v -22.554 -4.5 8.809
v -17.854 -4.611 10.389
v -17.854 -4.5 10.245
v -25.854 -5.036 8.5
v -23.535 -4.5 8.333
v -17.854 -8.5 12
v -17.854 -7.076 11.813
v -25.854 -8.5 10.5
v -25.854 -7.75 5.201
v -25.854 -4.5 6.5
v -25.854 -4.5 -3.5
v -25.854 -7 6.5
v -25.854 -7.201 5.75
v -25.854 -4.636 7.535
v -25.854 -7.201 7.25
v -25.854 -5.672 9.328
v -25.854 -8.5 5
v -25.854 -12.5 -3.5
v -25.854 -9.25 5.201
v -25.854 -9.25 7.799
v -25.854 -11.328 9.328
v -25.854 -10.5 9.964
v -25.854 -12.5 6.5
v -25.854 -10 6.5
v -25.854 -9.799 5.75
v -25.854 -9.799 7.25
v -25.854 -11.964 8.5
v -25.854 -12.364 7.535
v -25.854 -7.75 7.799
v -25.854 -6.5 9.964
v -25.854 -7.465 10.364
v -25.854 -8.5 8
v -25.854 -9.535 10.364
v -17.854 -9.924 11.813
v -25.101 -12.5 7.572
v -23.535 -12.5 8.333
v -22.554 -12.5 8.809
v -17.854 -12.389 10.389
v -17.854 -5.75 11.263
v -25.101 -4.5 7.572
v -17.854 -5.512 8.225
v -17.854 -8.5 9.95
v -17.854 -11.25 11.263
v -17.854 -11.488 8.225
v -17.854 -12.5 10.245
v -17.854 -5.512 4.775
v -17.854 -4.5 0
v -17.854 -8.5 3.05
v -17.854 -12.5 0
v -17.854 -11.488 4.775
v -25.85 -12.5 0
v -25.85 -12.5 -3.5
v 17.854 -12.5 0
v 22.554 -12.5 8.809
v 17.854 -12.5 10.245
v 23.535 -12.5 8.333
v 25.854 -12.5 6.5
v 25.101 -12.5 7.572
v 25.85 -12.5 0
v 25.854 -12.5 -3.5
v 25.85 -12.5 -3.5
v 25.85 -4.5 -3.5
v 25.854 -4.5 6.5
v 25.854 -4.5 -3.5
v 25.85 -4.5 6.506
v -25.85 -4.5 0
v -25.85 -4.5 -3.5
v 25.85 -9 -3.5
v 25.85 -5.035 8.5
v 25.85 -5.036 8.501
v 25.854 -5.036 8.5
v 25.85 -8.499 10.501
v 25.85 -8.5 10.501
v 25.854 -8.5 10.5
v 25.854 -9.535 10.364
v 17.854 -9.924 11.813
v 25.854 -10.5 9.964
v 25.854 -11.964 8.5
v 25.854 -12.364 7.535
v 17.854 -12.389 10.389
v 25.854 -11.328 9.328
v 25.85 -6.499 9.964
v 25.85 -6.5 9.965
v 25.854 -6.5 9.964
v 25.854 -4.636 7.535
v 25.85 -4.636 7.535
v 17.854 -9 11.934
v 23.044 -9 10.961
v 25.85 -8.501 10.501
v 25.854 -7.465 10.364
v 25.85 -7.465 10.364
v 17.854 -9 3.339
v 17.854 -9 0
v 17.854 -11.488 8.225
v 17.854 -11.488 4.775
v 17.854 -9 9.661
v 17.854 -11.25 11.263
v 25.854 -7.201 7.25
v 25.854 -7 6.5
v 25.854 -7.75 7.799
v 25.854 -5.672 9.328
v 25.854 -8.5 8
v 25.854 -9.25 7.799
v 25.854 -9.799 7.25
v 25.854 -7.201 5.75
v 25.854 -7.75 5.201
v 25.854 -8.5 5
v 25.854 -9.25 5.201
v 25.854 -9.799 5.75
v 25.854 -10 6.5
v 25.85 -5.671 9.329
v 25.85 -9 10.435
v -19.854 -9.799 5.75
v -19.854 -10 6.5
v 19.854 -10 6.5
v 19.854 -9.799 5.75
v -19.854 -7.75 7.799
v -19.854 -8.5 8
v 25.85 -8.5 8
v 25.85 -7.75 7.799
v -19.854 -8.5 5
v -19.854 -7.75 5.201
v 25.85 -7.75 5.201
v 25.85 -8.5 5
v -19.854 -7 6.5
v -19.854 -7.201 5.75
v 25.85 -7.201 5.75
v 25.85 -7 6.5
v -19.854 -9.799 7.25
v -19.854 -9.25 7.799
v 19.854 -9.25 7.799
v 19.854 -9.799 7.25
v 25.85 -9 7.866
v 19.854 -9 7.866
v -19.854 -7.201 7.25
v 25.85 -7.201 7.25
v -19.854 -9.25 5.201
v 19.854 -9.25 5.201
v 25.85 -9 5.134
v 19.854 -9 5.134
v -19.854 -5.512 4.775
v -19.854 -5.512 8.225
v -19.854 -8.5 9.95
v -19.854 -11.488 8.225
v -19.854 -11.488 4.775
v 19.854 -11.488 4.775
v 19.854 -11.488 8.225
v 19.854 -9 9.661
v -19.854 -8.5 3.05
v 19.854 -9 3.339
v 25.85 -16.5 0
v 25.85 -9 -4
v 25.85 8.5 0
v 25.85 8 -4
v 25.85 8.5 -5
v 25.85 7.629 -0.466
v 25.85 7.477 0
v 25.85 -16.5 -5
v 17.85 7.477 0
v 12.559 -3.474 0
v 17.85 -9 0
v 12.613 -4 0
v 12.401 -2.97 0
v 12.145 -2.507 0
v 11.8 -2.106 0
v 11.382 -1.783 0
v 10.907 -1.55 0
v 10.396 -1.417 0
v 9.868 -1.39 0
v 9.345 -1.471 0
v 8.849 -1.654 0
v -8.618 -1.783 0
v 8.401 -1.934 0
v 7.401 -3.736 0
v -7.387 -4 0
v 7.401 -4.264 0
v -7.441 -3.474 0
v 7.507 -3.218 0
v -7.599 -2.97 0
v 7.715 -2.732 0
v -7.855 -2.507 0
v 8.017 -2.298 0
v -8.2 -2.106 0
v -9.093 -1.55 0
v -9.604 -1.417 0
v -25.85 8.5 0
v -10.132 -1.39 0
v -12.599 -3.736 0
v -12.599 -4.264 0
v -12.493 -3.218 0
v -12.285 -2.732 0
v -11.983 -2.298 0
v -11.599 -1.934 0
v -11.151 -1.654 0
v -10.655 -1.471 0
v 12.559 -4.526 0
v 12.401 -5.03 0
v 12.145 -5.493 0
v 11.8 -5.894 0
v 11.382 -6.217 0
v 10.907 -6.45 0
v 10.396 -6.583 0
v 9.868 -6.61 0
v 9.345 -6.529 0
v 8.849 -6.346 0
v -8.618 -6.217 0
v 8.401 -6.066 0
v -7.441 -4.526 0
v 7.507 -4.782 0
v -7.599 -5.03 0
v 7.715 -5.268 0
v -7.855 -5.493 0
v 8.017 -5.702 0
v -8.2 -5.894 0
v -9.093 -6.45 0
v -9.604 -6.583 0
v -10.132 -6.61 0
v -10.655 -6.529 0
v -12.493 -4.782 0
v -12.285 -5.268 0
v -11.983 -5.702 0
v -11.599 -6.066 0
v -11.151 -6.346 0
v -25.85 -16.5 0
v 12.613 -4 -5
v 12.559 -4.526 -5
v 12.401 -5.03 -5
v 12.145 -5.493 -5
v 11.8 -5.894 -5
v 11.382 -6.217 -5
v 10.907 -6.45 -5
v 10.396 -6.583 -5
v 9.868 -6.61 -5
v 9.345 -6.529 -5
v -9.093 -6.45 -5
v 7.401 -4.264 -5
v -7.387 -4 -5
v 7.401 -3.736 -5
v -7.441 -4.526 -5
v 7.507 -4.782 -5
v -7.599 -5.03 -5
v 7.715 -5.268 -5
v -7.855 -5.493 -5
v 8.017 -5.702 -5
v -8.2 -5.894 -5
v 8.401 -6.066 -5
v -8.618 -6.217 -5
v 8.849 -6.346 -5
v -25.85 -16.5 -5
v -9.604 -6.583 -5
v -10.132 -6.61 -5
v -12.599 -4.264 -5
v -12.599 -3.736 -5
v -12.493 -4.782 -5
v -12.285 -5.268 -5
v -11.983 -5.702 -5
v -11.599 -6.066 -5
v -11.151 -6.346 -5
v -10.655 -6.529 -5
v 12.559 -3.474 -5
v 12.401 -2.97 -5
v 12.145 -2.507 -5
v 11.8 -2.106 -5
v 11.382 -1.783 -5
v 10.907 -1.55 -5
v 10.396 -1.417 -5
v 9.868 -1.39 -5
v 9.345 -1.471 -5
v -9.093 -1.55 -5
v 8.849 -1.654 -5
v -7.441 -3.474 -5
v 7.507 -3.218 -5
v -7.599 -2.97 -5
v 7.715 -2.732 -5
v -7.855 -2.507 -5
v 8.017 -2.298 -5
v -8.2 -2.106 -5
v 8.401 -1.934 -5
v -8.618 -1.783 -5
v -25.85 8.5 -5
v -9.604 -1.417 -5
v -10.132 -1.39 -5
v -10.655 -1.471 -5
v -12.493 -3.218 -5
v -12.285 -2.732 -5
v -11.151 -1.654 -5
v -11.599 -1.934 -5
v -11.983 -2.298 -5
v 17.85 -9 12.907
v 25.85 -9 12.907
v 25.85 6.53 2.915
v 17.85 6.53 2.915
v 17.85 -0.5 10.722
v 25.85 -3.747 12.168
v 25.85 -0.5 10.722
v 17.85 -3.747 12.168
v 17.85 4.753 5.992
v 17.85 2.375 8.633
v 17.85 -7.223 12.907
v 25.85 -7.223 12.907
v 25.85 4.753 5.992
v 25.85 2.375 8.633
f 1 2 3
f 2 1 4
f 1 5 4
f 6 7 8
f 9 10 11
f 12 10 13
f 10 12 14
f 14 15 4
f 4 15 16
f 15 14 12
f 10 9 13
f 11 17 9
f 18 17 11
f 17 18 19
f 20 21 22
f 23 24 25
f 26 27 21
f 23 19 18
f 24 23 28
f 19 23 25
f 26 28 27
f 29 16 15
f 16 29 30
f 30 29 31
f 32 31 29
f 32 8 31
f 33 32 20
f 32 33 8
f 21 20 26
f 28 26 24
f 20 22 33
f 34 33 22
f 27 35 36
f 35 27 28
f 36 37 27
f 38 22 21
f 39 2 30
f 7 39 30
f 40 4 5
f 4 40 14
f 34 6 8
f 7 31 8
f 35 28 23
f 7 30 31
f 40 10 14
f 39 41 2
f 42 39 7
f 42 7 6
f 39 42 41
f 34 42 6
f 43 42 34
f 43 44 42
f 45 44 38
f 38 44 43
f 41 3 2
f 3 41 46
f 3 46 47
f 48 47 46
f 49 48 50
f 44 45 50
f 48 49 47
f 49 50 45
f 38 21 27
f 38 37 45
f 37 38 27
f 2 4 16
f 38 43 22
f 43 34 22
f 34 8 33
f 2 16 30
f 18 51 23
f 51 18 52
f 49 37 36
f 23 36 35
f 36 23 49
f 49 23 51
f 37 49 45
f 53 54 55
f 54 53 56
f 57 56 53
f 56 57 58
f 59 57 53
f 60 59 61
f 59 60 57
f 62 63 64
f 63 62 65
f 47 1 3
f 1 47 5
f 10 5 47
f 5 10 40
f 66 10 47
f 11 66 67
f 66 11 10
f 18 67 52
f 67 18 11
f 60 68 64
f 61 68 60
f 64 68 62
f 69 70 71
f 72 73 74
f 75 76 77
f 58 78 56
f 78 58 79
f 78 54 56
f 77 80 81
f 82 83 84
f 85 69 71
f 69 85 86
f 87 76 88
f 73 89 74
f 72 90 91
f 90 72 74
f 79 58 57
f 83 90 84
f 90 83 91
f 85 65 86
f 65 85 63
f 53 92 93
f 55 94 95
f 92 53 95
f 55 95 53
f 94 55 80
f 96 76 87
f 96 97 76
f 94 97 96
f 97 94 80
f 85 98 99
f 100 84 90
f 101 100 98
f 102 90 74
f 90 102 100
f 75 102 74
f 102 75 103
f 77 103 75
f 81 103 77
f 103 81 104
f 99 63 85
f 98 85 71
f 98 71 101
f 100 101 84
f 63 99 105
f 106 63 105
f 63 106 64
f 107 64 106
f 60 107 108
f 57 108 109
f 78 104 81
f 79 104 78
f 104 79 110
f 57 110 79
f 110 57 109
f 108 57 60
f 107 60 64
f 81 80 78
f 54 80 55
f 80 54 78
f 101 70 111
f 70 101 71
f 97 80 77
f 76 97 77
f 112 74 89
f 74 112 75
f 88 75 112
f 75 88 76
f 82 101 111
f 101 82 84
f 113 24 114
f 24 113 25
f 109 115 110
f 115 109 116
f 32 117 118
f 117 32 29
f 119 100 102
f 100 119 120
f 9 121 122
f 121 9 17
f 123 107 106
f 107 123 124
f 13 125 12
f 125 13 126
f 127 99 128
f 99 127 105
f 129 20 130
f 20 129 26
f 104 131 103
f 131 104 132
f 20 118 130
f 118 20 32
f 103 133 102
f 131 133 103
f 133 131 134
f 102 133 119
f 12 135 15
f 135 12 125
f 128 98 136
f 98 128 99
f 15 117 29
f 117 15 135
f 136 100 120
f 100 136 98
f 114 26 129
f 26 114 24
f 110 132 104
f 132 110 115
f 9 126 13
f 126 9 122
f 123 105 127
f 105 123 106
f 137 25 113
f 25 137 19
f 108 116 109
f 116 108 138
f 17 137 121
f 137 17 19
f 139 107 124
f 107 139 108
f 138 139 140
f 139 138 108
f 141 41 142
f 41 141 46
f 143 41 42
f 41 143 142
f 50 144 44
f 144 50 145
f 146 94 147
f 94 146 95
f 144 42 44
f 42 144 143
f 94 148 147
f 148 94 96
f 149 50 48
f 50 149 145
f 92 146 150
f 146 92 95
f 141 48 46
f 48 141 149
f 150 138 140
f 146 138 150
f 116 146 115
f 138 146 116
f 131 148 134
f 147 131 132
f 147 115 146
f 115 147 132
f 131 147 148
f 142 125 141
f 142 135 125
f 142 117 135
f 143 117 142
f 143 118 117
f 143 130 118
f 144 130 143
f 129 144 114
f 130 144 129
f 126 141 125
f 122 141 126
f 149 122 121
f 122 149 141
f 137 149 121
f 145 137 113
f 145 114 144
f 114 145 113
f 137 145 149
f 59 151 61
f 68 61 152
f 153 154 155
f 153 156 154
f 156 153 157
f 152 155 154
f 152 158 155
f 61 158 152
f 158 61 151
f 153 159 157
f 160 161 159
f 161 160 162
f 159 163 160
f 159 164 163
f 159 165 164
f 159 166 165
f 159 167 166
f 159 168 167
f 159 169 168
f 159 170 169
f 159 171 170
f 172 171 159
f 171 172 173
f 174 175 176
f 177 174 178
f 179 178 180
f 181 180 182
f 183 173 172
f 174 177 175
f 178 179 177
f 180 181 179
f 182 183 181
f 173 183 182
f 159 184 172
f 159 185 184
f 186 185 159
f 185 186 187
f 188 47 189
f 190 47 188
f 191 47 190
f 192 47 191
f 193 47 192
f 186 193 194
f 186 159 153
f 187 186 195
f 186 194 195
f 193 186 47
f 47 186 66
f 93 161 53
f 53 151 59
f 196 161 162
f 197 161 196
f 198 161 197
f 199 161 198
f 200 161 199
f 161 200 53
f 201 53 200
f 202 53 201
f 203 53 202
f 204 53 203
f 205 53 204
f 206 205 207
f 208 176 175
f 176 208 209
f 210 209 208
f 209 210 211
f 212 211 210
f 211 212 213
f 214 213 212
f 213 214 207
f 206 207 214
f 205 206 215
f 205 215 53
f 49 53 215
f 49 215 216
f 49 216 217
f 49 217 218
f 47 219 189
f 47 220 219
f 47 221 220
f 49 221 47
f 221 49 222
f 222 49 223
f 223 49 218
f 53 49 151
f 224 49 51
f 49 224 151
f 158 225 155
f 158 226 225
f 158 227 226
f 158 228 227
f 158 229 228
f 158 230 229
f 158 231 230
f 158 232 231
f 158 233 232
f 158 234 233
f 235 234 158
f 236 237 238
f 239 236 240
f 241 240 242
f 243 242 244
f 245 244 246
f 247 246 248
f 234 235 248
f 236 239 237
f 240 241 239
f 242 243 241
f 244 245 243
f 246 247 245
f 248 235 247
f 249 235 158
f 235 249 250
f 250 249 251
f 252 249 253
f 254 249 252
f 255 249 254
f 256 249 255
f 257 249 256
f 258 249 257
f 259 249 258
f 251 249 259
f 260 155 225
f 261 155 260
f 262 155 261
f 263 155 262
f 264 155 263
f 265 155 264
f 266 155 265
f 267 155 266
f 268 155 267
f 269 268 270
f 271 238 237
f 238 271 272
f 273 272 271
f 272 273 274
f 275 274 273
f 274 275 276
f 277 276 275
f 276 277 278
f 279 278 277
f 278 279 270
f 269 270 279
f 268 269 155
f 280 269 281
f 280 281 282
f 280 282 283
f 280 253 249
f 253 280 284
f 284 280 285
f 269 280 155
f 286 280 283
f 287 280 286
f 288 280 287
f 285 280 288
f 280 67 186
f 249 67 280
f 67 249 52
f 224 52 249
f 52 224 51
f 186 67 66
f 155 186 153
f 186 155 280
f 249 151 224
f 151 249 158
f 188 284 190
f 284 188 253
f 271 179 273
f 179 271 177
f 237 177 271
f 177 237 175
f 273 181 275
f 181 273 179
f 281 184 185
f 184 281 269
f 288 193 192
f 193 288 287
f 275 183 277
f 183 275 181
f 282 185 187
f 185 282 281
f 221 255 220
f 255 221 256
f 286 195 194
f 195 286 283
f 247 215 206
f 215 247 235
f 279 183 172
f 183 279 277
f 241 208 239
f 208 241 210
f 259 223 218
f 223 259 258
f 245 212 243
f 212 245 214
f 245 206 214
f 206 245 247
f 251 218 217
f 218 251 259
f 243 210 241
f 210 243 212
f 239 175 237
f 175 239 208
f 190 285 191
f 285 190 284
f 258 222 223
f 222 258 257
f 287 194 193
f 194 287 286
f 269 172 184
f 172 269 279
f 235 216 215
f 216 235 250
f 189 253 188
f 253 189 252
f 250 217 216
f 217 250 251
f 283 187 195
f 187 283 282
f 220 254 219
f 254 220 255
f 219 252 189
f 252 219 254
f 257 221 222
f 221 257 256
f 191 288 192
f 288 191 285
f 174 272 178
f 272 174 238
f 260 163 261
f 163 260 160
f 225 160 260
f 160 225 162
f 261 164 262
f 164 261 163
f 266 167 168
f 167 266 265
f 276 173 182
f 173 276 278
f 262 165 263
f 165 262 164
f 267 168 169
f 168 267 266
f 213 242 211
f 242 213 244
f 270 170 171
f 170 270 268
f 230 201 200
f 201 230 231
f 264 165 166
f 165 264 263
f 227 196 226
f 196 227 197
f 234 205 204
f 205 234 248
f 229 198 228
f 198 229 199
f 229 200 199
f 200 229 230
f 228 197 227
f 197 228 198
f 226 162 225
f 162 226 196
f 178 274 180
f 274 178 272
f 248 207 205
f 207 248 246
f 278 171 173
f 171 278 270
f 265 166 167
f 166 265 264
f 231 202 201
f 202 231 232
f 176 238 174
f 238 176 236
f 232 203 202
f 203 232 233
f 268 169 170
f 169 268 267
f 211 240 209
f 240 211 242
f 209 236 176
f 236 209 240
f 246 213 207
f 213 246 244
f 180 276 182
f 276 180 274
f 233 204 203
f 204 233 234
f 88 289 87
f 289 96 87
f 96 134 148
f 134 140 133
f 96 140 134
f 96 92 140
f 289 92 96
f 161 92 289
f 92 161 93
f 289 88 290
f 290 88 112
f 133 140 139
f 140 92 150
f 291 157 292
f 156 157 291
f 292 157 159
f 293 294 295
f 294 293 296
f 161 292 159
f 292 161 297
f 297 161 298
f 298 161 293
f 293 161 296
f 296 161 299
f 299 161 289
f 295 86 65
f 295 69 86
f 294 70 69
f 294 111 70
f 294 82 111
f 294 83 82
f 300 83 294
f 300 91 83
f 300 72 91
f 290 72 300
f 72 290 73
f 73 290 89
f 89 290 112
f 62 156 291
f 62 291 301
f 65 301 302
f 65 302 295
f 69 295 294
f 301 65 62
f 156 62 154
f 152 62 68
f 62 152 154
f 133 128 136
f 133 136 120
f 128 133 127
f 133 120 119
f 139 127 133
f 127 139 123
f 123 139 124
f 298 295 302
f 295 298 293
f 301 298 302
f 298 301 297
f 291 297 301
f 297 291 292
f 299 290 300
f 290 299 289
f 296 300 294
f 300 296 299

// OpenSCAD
// file: configuration.scad
// Increase this if your slicer or printer make holes too tight.
extra_radius = 0.2;

// OD = outside diameter, corner to corner.
m3_nut_od = 6.1;
m3_nut_radius = m3_nut_od/2 + 0.2 + extra_radius;

// Major diameter of metric 3mm thread.
m3_major = 2.85;
m3_radius = m3_major/2 + extra_radius;
m3_wide_radius = m3_major/2 + 0.2 + extra_radius;

// NEMA17 stepper motors.
motor_shaft_diameter = 5;
motor_shaft_radius = motor_shaft_diameter/2 + extra_radius;

// Frame brackets.
thickness = 3.6;
// file: myLibs.scad
pi= 3.14159265359;

module hole(diam, height, clearance= 0.1)
{
        fn= round(diam * pi / 0.5);
        cylinder(h= height, r=diam / 2 / cos(180 / fn) + clearance, $fn=fn);
}

module nutTrap(ffd, faces=6, height=1)
{
	cylinder(h= height, r=ffd / cos(180 / faces) / 2 + 0.05, $fn=faces);
}

// A slot which has rounded ends, but total length is l
module slot(d= 4, l= 8, ht= 1, clearance=0.1) {
	fn= round(d * pi / 0.5);
	rd= d / 2 / cos(180 / fn) + clearance;
	d1= rd*2;
	union() {
		translate([0,0,ht/2]) cube([l-d1, d1, ht], center=true);
		translate([-(l-d1)/2, 0, ht/2]) cylinder(h=ht, r=rd, $fn=fn, center=true); 
		translate([(l-d1)/2, 0, ht/2]) cylinder(h=ht, r=rd, $fn=fn, center=true); 
	}
	
}
// file: arm-mount.scad
include <configuration.scad>;

ratio= 1.39;
separation = 37.2*ratio;
radius = 33*ratio;
height = 8;
cone_r1 = height/2;
cone_r2 = 5.5;

echo("Separation= ", separation);

module arm_mount_raw() {
	difference() {
		union() {
	   		translate([-separation/2,-10,-height/2]) cube([separation, 2, height]);		
			intersection() {
		   		cube([separation, 20, height], center=true);
			    union() {
		          for (s = [-1, 1]) scale([s, 1, 1]) {
		            translate([separation/2-4, 0, 0]) rotate([0, 90, 0])
		              cylinder(r1=cone_r2, r2=cone_r1, h=8, center=true, $fn=24);
		            translate([separation/2-4, -5, 0])
		              cube([8, 10, height], center=true);
		          }
				}
			}
	  }
	  rotate([0, 90, 0])
	      cylinder(r=1.5, h=separation+1, center=true, $fn=12);
	  rotate([90, 0, 90])
	      cylinder(r=m3_nut_radius, h=separation-12, center=true, $fn=6);
	}
}

module arm_mount() {
	translate([0,10,0]) arm_mount_raw();
}

arm_mount();
// file: carriage_plate_standard_c14005_rev_2.scad
// MakerSlide Component
// http://www.makerslide.com
// c14005_rev_2
// Standard Wheel Carriage Plate
// Original by Barton Dring
// OpenSCAD model by Mike Sheldrake

centeredCarriagePlate();

module centeredCarriagePlate() {
	translate([-90/2,-160/2,0]) standard_wheel_carriage_plate();
}

module standard_wheel_carriage_plate(thickness=3.175) {
color([175/255,178/255,183/255])
difference() {

// 90mm by 160mm plate 
// 3.175mm thick by default,
// but you can pass a different thickness to this module
cube([90,160,3.175],center=false);

// 5mm diam. holes
for(i=[
  [12.7,10],
  [12.7,30],
  [12.7,70],
  [12.7,80],
  [12.7,90],
  [12.7,112.3],
  [12.7,130],
  [12.7,150],
  [35,10],
  [35,60],
  [35,80],
  [35,100],
  [35,150],
  [45,70],
  [45,90],
  [55,10],
  [55,60],
  [55,80],
  [55,100],
  [55,150],
  [77.3,30],
  [77.3,70],
  [77.3,90],
  [77.3,112.3],
  [77.3,130],

  //These are 5mm holes in the 7mm hole spots that we will do next.
  //For some reason including them here too makes the OpenCSG display look right.
  //Not needed for CGAL render though.
  [12.7,47.7],
  [45,47.7],
  [77.3,10],
  [77.3,47.7],
  [77.3,80],
  [77.3,150]

  ]) { translate([i[0],i[1],-0.2]) cylinder(h=thickness+1,r=5/2,center=false); }

// 7mm diam. holes 
for(i=[
  [12.7,47.7],
  [45,47.7],
  [77.3,10],
  [77.3,47.7],
  [77.3,80],
  [77.3,150]
  ]) { translate([i[0],i[1],-0.2]) cylinder(h=thickness+1,r=7/2,center=false); }

// rounded corners on plate 
for(i=[
  [0,0,0],
  [90,160,180],
  [90,0,90],
  [0,160,270]
  ]
  ) {
	translate([i[0],i[1],0]) rotate(a=[0,0,i[2]]) translate([10,10,-0.1]) rotate(a=[0,0,180]) difference() {
		cube([11,11,thickness+1],center=false);
		translate([0,0,-0.1]) cylinder(h=thickness+2,r=10,center=false);
		}
	}
}
}
// main file
use <carriage_plate_standard_c14005_rev_2.scad>
use <arm-mount.scad>
use <myLibs.scad>

w= 52-0.3;
h= 25;
thickness=4;
basethickness=5;
offset= sin(30) * w/2;
sidel= sin(30) * w;

module triangle(o_len, a_len, depth)
{
    linear_extrude(height=depth)
    {
        polygon(points=[[0,0],[a_len,0],[0,o_len]], paths=[[0,1,2]]);
    }
}

module armPlate(w=w, h=h) {
	// base plate
	cube([w,h,basethickness], center=true);
}

module qcylinder(r, h) {
	difference() {
		cylinder(r=r, h=h);
		translate([-r,-r,-1]) {
			cube([r,r*2,h+2]);
			cube([r*2,r,h+2]);
		}
	}
}

module backPlate() {
	union() {
		difference() {
			translate([0,0,-basethickness/2]) union() {
				translate([0, -4, 0]) armPlate();
				translate([0,-h/2+8/2,-1]) rotate([90,0,0]) arm_mount();
			}
			
			// attachment holes
			#translate([-10,-4,-thickness/2-4]) hole(5, thickness+5);
			#translate([10,-4,-thickness/2-4]) hole(5, thickness+5);
		}

		// support
		translate([w/2-8,-9,-4]) rotate([90,0,90]) qcylinder(r=17, h=8);
		// translate([w/2-8,-5,-0.1]) rotate([90, 0, 90]) triangle(9, 13, 8);
		// translate([-w/2,-5,-0.1]) rotate([90, 0, 90]) triangle(9, 13, 8);

		// #translate([w/2-8,-15.6,-0.1]) cube([8, 4, 10]);
		// #translate([-w/2,-15.6,-0.1]) cube([8, 4, 10]);
	}
}

module sidePlate() {
	aw1= tan(60)*sidel;
	sl1= sidel-1;
	sidel2= sin(30) * w/2;
	aw2= tan(60)*(sidel2);
	sl2= sidel2;
	aw3= 19;
	sl3= 5;
	union() {
		translate([0,0,-basethickness/2]) armPlate(w=aw1);

		// vertical supports
		translate([-aw1/2+thickness/2,-h/2+8/2,sl1/2]) cube([thickness, 8, sl1], center=true);
		translate([0,-h/2+8/2,sl2/2-1]) cube([thickness+2, 8, sl2], center=true);
		translate([aw3,-h/2+8/2,sl3/2]) cube([thickness+3, 8, sl3], center=true);

		// buttress
		translate([-aw1/2+thickness/2+thickness/2,-5,-0.1]) rotate([0,-90,0]) triangle(h-8, sl1, thickness);		

		translate([0,0,offset]) rotate([0,30,0]) {
			translate([0,-h/2+8/2,-1]) rotate([90,0,0]) arm_mount();
			// extra thickness for base
			translate([0,-h/2+8/2,-2]) cube([w-4,8,2], center=true);
		}
	}
}

module printPlate() {
	translate([0,30,0]) rotate([90,0,0]) backPlate();
	
	// left
//	translate([30,0,0]) rotate([-90,0,180]) mirror([0,1,0]) sidePlate();
	
	//right
//	translate([-30,0,0]) rotate([90,0,0]) sidePlate();
}

backPlate();
//printPlate();
//modelBack();

//%translate([0,0,-3.175-thickness]) rotate([0,0,-90]) translate([-90/2,-160/2,0]) standard_wheel_carriage_plate();

module modelSide() {
	sidePlate();
	
	
	separation= 51.708;
	ox=  sin(30) * 41.5;
	oy=  sin(30) * 9;
	echo("Offset= ", ox, oy);
	%translate([oy, -8.5, ox]) rotate([0,-60,0]){
		cylinder(r= 3/2, h= separation, center=true, $fn=64);
		cylinder(r=4/2, h= 1, center=true);
	}
	
	color("red") { translate([0,-8.5,50/2]) cube([.1,2, 50], center=true); }
	color("red") { %translate([0,-8.5,offset]) rotate([0,30,0]) translate([0,0,50/2]) cube([.1,2, 50], center=true); }
}

module modelBack() {
	backPlate();
	
	separation= 51.708;
	ox= 6.5;
	oy= 0;
	echo("Offset= ", ox, oy);
	%translate([oy, -8.5, ox]) rotate([0,90,0]){
		cylinder(r= 3/2, h= separation, center=true, $fn=64);
		cylinder(r=4/2, h= 1, center=true);
	}
	
	color("red") { translate([0,-8.5,50/2]) cube([.1,2, 50], center=true); }
}
